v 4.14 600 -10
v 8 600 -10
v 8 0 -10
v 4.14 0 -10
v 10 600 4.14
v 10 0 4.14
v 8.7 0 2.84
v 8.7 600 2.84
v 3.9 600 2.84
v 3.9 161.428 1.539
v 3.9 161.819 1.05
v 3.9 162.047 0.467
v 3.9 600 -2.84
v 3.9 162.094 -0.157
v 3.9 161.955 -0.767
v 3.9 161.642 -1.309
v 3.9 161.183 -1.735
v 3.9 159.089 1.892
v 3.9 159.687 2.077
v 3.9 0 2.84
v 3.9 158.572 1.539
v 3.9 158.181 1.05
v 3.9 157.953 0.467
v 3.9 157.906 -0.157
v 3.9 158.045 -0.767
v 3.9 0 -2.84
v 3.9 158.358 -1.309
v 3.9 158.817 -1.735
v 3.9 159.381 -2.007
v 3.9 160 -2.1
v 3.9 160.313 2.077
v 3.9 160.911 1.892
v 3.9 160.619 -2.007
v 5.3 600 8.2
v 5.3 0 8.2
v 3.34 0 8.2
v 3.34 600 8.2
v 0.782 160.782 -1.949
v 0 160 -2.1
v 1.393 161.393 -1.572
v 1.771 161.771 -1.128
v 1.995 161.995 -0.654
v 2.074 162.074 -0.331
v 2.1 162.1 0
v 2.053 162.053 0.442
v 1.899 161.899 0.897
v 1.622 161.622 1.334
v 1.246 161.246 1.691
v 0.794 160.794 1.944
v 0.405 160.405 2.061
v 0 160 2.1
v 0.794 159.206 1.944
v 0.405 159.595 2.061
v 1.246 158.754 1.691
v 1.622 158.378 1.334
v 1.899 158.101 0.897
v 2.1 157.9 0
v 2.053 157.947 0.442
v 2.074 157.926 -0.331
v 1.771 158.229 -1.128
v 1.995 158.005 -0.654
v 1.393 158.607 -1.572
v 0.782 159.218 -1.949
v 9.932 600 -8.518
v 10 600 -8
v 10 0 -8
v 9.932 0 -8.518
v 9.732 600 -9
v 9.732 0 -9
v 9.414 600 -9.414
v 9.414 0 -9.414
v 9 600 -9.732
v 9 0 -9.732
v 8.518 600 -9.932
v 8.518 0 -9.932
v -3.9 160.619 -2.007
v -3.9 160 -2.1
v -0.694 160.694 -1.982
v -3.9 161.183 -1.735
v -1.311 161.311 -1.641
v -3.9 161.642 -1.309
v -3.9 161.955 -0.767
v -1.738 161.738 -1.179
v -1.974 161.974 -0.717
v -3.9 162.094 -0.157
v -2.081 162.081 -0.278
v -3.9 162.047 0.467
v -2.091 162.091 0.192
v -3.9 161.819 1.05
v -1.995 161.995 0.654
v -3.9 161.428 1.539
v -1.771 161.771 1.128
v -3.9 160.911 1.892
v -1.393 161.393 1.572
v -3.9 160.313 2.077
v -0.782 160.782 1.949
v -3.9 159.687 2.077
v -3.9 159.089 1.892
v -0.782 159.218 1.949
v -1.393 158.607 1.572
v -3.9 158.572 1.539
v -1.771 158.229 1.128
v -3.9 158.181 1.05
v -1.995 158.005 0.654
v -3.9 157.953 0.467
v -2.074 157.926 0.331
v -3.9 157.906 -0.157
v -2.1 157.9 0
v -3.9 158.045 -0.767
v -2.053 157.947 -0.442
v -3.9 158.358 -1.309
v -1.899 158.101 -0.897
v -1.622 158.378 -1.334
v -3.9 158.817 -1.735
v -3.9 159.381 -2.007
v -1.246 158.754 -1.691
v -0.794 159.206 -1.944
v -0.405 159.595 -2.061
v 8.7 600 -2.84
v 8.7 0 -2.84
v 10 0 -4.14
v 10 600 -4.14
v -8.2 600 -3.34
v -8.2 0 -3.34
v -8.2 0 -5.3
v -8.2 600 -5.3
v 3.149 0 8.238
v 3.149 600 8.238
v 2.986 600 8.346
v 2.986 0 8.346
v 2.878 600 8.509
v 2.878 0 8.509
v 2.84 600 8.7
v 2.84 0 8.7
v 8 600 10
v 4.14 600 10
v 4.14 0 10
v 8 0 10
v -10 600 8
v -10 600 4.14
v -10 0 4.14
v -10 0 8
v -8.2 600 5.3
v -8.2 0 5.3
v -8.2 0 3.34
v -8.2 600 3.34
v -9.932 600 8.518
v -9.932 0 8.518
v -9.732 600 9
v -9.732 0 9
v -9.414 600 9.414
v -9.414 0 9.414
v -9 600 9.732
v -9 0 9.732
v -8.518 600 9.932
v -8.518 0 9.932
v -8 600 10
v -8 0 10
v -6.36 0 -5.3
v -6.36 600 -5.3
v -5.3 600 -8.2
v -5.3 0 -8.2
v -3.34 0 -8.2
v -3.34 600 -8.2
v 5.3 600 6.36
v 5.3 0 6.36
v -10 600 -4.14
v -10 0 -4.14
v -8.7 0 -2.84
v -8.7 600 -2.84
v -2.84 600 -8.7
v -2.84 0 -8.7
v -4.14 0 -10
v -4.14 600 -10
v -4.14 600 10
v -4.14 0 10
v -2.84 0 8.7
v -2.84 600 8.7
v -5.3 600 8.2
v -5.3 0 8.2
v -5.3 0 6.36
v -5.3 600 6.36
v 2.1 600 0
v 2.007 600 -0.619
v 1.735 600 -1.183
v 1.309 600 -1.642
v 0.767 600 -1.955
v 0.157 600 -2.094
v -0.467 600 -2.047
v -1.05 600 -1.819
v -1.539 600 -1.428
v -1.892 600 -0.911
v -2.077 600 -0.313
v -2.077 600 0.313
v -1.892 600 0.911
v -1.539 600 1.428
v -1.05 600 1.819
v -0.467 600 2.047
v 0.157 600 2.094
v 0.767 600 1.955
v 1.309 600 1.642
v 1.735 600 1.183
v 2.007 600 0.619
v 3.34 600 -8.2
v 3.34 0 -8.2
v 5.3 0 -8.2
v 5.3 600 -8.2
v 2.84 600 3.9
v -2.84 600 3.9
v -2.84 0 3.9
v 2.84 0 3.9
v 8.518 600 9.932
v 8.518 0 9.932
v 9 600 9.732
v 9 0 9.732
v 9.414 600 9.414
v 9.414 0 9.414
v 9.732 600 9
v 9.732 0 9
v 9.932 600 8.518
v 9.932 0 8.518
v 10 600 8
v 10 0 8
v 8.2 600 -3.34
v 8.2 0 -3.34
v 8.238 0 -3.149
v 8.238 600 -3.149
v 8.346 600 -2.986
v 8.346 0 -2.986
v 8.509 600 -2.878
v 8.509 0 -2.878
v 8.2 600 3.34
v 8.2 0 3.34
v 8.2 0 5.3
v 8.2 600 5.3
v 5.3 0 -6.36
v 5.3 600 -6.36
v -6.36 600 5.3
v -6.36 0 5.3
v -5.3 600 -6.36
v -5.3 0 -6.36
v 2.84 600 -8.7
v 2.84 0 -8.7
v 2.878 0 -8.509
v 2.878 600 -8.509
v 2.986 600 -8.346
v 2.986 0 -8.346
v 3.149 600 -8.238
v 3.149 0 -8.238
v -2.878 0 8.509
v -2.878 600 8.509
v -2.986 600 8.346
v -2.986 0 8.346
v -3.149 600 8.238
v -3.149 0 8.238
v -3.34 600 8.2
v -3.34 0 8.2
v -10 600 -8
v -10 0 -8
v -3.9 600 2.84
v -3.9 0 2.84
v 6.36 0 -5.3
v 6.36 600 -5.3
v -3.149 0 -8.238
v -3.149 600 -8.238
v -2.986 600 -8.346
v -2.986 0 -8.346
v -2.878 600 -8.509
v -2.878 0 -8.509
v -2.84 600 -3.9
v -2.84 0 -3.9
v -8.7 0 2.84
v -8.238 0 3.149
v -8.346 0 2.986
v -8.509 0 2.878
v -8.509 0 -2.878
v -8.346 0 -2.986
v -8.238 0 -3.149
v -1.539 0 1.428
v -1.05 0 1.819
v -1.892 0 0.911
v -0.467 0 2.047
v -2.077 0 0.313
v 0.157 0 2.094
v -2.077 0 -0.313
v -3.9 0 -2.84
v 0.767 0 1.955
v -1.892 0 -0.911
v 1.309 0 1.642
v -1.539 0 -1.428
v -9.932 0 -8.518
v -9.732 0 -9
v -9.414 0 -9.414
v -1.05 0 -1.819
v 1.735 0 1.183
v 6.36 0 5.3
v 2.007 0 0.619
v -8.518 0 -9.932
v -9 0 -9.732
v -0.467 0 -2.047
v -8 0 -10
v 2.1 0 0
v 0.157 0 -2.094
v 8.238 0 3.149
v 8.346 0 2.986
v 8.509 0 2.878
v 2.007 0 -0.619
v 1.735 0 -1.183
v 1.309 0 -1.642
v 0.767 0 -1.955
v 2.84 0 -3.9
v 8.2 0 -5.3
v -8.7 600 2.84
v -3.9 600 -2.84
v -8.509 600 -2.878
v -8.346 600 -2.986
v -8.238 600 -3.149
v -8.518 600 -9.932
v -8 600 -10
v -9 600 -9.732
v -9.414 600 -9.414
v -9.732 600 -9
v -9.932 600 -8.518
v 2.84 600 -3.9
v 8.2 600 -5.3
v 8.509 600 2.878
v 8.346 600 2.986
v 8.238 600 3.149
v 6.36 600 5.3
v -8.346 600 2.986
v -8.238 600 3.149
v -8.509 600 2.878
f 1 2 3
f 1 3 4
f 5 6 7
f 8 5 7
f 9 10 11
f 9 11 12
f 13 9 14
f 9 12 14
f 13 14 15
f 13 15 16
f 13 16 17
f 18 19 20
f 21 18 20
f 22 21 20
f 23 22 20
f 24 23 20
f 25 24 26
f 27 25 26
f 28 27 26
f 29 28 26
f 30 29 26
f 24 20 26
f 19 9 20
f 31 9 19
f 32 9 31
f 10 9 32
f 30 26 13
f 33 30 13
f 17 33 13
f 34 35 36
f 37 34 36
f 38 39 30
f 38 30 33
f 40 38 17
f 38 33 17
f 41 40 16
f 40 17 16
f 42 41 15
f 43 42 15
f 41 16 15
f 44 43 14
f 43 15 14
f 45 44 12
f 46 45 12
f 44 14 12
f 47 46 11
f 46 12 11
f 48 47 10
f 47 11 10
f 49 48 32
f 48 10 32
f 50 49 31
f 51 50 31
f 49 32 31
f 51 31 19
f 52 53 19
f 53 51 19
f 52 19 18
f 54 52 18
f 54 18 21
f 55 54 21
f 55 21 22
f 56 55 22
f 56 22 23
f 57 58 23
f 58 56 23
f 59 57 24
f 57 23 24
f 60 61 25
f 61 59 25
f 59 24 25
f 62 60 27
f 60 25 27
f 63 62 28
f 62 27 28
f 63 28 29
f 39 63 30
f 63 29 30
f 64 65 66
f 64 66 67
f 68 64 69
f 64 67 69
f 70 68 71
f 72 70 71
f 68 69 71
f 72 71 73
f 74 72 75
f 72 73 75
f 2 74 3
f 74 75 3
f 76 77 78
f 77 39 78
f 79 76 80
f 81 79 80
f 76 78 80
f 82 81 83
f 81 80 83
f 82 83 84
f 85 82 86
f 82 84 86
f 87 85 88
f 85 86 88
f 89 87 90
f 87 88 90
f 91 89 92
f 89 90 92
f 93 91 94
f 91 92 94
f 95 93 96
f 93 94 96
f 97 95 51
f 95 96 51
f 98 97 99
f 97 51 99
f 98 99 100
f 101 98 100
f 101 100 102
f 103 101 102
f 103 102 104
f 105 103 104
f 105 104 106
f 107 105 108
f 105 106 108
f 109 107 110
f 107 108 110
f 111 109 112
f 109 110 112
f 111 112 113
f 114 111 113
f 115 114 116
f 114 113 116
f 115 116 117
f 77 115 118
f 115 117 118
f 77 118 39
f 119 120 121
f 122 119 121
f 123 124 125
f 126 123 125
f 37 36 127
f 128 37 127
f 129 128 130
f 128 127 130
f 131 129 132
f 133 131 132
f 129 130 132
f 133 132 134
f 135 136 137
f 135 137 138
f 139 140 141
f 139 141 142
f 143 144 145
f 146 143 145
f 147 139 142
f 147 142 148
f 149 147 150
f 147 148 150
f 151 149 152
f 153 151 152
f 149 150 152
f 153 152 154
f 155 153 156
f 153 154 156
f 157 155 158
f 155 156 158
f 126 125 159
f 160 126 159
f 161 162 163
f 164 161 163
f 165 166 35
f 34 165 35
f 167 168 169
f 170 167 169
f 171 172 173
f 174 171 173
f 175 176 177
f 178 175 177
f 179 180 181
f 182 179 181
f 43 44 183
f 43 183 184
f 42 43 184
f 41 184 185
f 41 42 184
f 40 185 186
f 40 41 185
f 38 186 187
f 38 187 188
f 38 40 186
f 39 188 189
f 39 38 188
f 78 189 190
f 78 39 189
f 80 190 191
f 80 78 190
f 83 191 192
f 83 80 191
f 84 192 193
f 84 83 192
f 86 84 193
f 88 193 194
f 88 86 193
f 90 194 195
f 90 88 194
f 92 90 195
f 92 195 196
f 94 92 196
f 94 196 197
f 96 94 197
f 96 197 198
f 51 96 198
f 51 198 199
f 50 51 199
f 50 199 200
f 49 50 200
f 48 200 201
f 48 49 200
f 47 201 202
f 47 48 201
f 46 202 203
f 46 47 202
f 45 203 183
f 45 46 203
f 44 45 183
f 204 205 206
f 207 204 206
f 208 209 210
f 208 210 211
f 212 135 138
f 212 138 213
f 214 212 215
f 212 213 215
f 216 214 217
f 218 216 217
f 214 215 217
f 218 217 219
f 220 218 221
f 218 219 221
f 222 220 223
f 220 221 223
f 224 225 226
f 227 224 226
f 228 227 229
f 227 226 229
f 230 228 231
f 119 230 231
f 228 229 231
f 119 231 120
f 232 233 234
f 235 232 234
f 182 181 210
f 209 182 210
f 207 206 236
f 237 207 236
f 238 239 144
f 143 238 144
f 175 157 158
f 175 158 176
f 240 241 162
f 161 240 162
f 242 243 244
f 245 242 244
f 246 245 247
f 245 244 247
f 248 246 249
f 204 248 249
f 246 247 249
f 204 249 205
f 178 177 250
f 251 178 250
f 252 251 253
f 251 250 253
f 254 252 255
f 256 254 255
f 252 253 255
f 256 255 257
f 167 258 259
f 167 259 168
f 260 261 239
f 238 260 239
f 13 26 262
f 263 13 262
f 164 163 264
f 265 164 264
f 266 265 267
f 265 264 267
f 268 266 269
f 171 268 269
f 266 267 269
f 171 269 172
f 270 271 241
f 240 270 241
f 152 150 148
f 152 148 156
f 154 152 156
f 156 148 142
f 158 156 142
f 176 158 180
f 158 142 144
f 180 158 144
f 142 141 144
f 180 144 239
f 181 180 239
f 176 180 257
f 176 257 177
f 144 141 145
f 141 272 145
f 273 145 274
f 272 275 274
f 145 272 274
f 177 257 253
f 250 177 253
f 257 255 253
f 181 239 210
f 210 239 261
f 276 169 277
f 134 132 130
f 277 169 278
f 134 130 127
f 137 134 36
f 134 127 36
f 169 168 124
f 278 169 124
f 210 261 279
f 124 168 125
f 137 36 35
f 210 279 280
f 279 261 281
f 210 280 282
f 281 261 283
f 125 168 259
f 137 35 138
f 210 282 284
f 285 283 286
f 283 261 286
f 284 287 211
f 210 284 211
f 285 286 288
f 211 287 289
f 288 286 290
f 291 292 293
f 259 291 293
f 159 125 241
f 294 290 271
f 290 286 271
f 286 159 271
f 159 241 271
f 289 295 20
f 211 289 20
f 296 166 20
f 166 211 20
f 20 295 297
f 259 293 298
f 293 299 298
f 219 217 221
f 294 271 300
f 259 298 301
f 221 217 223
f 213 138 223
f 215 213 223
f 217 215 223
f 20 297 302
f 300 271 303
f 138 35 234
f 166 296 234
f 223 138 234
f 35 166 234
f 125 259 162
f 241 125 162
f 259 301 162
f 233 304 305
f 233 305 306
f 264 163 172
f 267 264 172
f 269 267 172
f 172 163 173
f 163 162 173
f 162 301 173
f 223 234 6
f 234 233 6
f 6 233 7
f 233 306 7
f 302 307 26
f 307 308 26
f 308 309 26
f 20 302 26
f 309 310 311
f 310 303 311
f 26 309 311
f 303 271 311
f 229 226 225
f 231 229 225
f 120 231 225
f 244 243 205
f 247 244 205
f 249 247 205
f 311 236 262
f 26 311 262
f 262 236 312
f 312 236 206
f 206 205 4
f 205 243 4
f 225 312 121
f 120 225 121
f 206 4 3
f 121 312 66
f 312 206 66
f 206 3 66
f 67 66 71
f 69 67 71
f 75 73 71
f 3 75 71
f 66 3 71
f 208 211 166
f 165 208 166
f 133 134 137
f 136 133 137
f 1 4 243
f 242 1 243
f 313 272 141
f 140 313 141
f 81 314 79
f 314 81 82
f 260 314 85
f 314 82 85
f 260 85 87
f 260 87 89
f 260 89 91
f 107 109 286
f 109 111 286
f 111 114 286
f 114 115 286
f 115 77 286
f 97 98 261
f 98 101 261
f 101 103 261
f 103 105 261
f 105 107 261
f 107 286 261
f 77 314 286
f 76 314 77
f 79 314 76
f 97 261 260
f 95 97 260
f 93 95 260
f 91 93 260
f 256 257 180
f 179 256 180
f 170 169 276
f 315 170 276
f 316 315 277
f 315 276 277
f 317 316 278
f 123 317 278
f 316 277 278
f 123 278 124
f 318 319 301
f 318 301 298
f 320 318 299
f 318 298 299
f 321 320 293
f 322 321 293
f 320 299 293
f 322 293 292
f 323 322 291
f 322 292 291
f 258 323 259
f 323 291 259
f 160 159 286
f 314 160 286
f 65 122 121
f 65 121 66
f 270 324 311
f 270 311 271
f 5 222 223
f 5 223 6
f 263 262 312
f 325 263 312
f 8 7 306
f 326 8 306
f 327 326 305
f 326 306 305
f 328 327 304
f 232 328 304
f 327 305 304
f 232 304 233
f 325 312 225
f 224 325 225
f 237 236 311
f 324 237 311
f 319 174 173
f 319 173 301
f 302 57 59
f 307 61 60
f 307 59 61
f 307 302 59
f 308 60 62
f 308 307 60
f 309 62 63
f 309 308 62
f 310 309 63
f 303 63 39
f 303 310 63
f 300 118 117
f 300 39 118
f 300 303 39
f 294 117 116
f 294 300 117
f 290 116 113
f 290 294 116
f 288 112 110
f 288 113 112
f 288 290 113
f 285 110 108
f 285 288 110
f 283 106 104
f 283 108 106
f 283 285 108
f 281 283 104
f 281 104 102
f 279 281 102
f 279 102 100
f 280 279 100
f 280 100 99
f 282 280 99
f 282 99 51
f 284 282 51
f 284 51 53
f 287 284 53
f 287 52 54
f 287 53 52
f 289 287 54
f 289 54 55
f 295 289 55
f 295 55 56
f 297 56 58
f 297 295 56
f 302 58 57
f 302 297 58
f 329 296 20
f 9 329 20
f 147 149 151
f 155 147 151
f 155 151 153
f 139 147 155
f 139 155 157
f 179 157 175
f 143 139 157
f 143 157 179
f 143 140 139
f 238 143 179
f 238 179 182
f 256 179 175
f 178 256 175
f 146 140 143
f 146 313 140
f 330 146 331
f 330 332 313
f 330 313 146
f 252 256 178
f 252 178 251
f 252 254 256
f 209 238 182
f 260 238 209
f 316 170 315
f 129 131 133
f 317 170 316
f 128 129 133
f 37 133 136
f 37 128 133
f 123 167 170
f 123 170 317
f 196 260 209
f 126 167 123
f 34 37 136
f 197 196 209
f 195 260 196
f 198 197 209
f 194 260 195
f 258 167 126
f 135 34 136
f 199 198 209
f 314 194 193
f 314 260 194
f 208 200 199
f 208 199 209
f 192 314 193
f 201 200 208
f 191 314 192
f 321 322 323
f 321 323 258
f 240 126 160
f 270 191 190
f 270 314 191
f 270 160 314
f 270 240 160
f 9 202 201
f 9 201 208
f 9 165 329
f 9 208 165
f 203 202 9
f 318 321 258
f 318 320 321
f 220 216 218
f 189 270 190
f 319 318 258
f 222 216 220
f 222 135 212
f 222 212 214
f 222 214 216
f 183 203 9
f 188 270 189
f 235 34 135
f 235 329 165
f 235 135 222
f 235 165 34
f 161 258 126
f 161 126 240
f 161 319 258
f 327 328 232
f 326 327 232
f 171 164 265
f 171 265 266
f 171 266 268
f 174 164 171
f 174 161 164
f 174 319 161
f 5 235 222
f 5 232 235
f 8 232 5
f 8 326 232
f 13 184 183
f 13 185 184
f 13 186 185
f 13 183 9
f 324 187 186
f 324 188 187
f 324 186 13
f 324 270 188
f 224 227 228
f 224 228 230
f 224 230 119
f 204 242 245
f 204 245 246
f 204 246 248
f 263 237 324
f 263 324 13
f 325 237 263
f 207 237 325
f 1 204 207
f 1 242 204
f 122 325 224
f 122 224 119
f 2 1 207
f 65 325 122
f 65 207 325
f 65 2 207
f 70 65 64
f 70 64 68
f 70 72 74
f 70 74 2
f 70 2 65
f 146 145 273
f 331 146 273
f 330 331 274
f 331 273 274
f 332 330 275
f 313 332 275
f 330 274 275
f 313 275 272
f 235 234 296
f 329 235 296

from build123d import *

# Parameters (mm, degrees)
CROQUIS1_R              = 2.1
SALIENTE_EXTRUIR2_DEPTH = 600
CROQUIS2_R              = 2.1
CORTAR_EXTRUIR2_DEPTH   = 175


with BuildPart() as part:
    # Croquis1 → Saliente-Extruir2 (new body)
    with BuildSketch(Plane(origin=(0, 0, 0), x_dir=(1, 0, 0), z_dir=(0, 1, 0))):
        with BuildLine():
            Line((3.9, -2.84), (3.9, 2.84))
            Line((3.9, 2.84), (6.36, 5.3))
            Line((6.36, 5.3), (8.2, 5.3))
            Line((8.2, 5.3), (8.2, 3.34))
            ThreePointArc((8.2, 3.34), (8.346446609, 2.986446609), (8.7, 2.84))
            Line((8.7, 2.84), (10, 4.14))
            Line((10, 4.14), (10, 8))
            ThreePointArc((10, 8), (9.414213562, 9.414213562), (8, 10))
            Line((8, 10), (4.14, 10))
            Line((4.14, 10), (2.84, 8.7))
            ThreePointArc((2.84, 8.7), (2.986446609, 8.346446609), (3.34, 8.2))
            Line((3.34, 8.2), (5.3, 8.2))
            Line((5.3, 8.2), (5.3, 6.36))
            Line((5.3, 6.36), (2.84, 3.9))
            Line((2.84, 3.9), (-2.84, 3.9))
            Line((-2.84, 3.9), (-5.3, 6.36))
            Line((-5.3, 6.36), (-5.3, 8.2))
            Line((-5.3, 8.2), (-3.34, 8.2))
            ThreePointArc((-3.34, 8.2), (-2.986446609, 8.346446609), (-2.84, 8.7))
            Line((-2.84, 8.7), (-4.14, 10))
            Line((-4.14, 10), (-8, 10))
            ThreePointArc((-8, 10), (-9.414213562, 9.414213562), (-10, 8))
            Line((-10, 8), (-10, 4.14))
            Line((-10, 4.14), (-8.7, 2.84))
            ThreePointArc((-8.7, 2.84), (-8.346446609, 2.986446609), (-8.2, 3.34))
            Line((-8.2, 3.34), (-8.2, 5.3))
            Line((-8.2, 5.3), (-6.36, 5.3))
            Line((-6.36, 5.3), (-3.9, 2.84))
            Line((-3.9, 2.84), (-3.9, -2.84))
            Line((-3.9, -2.84), (-6.36, -5.3))
            Line((-6.36, -5.3), (-8.2, -5.3))
            Line((-8.2, -5.3), (-8.2, -3.34))
            ThreePointArc((-8.2, -3.34), (-8.346446609, -2.986446609), (-8.7, -2.84))
            Line((-8.7, -2.84), (-10, -4.14))
            Line((-10, -4.14), (-10, -8))
            ThreePointArc((-10, -8), (-9.414213562, -9.414213562), (-8, -10))
            Line((-8, -10), (-4.14, -10))
            Line((-4.14, -10), (-2.84, -8.7))
            ThreePointArc((-2.84, -8.7), (-2.986446609, -8.346446609), (-3.34, -8.2))
            Line((-3.34, -8.2), (-5.3, -8.2))
            Line((-5.3, -8.2), (-5.3, -6.36))
            Line((-5.3, -6.36), (-2.84, -3.9))
            Line((-2.84, -3.9), (2.84, -3.9))
            Line((2.84, -3.9), (5.3, -6.36))
            Line((5.3, -6.36), (5.3, -8.2))
            Line((5.3, -8.2), (3.34, -8.2))
            ThreePointArc((3.34, -8.2), (2.986446609, -8.346446609), (2.84, -8.7))
            Line((2.84, -8.7), (4.14, -10))
            Line((4.14, -10), (8, -10))
            ThreePointArc((8, -10), (9.414213562, -9.414213562), (10, -8))
            Line((10, -8), (10, -4.14))
            Line((10, -4.14), (8.7, -2.84))
            ThreePointArc((8.7, -2.84), (8.346446609, -2.986446609), (8.2, -3.34))
            Line((8.2, -3.34), (8.2, -5.3))
            Line((8.2, -5.3), (6.36, -5.3))
            Line((6.36, -5.3), (3.9, -2.84))
        make_face()
        Circle(CROQUIS1_R, mode=Mode.SUBTRACT)
    extrude(amount=SALIENTE_EXTRUIR2_DEPTH)

    # Croquis2 → Cortar-Extruir2 (cut, symmetric)
    with BuildSketch(Plane(origin=(0, 0, 0), x_dir=(0, 0, -1), z_dir=(1, 0, 0))):
        with Locations((0, 160)):
            Circle(CROQUIS2_R)
    extrude(amount=CORTAR_EXTRUIR2_DEPTH, both=True, mode=Mode.SUBTRACT)


solid = part.part
